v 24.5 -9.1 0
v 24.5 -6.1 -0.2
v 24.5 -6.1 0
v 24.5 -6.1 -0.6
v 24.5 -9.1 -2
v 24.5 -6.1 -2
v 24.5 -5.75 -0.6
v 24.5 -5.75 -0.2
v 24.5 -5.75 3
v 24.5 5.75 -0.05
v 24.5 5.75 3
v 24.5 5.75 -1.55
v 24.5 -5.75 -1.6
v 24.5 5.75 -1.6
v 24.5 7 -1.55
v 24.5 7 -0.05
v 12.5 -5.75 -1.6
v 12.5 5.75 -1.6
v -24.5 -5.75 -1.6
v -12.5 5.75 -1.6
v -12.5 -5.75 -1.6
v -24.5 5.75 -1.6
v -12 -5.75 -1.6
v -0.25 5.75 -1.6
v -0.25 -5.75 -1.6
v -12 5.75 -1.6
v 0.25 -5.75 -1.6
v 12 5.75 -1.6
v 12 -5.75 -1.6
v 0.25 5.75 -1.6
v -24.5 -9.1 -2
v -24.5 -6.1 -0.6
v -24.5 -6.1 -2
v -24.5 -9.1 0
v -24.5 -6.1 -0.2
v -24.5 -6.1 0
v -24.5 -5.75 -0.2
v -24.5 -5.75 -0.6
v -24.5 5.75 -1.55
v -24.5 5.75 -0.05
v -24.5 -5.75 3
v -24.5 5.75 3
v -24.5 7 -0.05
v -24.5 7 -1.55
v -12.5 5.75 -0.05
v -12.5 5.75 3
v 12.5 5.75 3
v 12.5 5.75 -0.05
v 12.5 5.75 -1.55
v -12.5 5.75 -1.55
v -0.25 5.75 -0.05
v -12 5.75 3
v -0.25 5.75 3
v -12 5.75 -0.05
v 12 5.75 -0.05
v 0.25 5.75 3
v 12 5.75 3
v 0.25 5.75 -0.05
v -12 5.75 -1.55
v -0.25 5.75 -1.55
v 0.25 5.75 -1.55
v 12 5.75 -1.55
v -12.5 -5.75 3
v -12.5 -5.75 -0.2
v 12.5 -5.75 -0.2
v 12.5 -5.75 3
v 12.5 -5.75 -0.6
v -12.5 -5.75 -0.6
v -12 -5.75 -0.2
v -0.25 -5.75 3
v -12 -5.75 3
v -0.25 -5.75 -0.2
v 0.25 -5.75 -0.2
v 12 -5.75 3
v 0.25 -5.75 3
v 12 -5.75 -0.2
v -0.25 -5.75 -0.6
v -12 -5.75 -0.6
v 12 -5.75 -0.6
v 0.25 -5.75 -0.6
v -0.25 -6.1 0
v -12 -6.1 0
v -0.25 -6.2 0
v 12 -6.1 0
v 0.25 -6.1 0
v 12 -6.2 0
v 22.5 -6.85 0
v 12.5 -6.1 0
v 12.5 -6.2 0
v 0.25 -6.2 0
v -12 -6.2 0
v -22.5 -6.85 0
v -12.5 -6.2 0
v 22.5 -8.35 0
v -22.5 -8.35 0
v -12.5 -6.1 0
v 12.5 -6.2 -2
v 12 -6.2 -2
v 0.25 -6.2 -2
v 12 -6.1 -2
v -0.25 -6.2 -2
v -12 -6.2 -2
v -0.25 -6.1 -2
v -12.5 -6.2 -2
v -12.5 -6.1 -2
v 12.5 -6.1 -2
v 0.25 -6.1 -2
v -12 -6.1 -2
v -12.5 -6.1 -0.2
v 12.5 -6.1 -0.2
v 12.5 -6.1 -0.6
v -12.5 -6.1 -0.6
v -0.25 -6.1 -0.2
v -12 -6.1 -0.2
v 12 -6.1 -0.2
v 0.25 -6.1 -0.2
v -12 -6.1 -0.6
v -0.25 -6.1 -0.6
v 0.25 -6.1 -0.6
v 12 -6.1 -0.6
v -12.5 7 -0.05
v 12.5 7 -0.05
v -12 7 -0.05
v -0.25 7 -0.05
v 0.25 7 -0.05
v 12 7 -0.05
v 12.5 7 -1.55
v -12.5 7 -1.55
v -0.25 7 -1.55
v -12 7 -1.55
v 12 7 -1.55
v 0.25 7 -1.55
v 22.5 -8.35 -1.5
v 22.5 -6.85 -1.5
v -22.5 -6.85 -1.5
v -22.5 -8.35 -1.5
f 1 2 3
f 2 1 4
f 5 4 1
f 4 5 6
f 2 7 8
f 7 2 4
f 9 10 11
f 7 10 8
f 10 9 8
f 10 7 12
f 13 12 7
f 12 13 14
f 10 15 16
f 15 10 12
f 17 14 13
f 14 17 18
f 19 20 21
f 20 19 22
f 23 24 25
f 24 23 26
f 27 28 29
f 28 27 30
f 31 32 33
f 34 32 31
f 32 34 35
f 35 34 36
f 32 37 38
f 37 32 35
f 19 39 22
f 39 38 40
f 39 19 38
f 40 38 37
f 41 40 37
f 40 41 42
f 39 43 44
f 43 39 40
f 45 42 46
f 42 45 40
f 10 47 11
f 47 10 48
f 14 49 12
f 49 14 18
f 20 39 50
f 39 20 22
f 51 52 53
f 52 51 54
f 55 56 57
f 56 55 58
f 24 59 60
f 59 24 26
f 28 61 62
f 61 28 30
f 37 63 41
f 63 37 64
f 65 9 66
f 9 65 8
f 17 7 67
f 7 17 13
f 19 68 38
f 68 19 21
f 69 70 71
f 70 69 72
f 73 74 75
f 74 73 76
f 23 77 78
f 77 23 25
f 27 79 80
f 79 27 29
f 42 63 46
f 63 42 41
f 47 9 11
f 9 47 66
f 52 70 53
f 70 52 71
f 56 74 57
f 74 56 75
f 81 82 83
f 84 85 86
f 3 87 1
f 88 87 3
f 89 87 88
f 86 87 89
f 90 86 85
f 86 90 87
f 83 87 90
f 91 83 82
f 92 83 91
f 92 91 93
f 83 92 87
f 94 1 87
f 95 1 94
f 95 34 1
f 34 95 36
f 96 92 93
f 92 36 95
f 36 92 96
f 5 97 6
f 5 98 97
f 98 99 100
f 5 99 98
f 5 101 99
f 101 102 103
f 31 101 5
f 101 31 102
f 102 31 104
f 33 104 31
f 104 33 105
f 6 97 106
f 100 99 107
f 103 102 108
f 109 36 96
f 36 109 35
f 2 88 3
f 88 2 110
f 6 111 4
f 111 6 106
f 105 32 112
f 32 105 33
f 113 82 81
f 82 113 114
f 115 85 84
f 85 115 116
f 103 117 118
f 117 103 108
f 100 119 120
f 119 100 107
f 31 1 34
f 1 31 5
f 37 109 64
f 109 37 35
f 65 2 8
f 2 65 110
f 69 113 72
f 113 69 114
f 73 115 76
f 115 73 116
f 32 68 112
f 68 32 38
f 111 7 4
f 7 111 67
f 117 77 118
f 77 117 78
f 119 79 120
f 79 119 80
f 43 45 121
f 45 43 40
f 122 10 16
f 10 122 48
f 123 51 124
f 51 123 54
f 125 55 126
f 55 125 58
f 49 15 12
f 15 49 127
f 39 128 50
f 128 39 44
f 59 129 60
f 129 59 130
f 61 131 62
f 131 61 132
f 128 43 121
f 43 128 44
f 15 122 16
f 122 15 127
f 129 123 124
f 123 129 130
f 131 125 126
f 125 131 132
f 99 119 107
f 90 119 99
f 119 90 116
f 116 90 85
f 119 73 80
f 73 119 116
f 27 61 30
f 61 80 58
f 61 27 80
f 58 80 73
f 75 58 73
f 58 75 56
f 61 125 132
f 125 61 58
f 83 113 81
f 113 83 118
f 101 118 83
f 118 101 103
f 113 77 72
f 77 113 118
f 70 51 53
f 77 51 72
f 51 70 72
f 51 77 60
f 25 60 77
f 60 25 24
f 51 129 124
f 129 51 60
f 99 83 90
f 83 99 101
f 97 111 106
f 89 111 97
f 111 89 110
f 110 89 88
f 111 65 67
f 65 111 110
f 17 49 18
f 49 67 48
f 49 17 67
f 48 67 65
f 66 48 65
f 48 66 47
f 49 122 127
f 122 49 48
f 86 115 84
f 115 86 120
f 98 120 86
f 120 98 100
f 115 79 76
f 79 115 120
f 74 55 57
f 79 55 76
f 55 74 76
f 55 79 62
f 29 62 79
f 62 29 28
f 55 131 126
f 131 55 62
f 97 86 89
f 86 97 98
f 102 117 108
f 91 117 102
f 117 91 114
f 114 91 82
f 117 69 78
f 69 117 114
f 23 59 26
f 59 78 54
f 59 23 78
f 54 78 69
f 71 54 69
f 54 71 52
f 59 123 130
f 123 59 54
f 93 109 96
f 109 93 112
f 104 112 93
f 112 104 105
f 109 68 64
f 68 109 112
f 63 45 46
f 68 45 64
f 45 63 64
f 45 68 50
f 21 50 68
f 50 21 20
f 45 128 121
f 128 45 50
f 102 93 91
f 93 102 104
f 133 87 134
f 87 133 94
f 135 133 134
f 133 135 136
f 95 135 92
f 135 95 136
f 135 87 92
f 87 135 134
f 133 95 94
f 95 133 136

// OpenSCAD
difference() {

   union () {
   translate ([0,0,-1.5+1.4]) cube ( [49,11.5,3], center = true ); //buttons below panel

   translate ([0,0,-1.5+3]) cube ( [49,11.5,3], center = true ); //buttons above panel

   translate ([0,-7.6,-1]) cube ( [49,3,2], center = true ); //buttons
   translate ([0,-6.5,-0.4]) cube ( [49,3,0.4], center = true ); //buttons

   translate ([0,6,-0.8]) cube ( [49,2,1.5], center = true ); //buttons


   //translate ([0,-8.5,0.7]) cube ( [49,4,1.4], center = true ); //buttons

   //translate ([0,-6.5,-0.4]) cube ( [49,4,3], center = true ); //buttons


   };

   translate ([0,1.3,0]) cube ( [0.5,15,9], center = true ); //buttons
   translate ([12.25,1.3,0]) cube ( [0.5,15,9], center = true ); //buttons
   translate ([-12.25,1.3,0]) cube ( [0.5,15,9], center = true ); //buttons


   translate ([0,-7.6,-0.75]) cube ( [45,1.5,1.5], center = true ); //buttons

   
};
